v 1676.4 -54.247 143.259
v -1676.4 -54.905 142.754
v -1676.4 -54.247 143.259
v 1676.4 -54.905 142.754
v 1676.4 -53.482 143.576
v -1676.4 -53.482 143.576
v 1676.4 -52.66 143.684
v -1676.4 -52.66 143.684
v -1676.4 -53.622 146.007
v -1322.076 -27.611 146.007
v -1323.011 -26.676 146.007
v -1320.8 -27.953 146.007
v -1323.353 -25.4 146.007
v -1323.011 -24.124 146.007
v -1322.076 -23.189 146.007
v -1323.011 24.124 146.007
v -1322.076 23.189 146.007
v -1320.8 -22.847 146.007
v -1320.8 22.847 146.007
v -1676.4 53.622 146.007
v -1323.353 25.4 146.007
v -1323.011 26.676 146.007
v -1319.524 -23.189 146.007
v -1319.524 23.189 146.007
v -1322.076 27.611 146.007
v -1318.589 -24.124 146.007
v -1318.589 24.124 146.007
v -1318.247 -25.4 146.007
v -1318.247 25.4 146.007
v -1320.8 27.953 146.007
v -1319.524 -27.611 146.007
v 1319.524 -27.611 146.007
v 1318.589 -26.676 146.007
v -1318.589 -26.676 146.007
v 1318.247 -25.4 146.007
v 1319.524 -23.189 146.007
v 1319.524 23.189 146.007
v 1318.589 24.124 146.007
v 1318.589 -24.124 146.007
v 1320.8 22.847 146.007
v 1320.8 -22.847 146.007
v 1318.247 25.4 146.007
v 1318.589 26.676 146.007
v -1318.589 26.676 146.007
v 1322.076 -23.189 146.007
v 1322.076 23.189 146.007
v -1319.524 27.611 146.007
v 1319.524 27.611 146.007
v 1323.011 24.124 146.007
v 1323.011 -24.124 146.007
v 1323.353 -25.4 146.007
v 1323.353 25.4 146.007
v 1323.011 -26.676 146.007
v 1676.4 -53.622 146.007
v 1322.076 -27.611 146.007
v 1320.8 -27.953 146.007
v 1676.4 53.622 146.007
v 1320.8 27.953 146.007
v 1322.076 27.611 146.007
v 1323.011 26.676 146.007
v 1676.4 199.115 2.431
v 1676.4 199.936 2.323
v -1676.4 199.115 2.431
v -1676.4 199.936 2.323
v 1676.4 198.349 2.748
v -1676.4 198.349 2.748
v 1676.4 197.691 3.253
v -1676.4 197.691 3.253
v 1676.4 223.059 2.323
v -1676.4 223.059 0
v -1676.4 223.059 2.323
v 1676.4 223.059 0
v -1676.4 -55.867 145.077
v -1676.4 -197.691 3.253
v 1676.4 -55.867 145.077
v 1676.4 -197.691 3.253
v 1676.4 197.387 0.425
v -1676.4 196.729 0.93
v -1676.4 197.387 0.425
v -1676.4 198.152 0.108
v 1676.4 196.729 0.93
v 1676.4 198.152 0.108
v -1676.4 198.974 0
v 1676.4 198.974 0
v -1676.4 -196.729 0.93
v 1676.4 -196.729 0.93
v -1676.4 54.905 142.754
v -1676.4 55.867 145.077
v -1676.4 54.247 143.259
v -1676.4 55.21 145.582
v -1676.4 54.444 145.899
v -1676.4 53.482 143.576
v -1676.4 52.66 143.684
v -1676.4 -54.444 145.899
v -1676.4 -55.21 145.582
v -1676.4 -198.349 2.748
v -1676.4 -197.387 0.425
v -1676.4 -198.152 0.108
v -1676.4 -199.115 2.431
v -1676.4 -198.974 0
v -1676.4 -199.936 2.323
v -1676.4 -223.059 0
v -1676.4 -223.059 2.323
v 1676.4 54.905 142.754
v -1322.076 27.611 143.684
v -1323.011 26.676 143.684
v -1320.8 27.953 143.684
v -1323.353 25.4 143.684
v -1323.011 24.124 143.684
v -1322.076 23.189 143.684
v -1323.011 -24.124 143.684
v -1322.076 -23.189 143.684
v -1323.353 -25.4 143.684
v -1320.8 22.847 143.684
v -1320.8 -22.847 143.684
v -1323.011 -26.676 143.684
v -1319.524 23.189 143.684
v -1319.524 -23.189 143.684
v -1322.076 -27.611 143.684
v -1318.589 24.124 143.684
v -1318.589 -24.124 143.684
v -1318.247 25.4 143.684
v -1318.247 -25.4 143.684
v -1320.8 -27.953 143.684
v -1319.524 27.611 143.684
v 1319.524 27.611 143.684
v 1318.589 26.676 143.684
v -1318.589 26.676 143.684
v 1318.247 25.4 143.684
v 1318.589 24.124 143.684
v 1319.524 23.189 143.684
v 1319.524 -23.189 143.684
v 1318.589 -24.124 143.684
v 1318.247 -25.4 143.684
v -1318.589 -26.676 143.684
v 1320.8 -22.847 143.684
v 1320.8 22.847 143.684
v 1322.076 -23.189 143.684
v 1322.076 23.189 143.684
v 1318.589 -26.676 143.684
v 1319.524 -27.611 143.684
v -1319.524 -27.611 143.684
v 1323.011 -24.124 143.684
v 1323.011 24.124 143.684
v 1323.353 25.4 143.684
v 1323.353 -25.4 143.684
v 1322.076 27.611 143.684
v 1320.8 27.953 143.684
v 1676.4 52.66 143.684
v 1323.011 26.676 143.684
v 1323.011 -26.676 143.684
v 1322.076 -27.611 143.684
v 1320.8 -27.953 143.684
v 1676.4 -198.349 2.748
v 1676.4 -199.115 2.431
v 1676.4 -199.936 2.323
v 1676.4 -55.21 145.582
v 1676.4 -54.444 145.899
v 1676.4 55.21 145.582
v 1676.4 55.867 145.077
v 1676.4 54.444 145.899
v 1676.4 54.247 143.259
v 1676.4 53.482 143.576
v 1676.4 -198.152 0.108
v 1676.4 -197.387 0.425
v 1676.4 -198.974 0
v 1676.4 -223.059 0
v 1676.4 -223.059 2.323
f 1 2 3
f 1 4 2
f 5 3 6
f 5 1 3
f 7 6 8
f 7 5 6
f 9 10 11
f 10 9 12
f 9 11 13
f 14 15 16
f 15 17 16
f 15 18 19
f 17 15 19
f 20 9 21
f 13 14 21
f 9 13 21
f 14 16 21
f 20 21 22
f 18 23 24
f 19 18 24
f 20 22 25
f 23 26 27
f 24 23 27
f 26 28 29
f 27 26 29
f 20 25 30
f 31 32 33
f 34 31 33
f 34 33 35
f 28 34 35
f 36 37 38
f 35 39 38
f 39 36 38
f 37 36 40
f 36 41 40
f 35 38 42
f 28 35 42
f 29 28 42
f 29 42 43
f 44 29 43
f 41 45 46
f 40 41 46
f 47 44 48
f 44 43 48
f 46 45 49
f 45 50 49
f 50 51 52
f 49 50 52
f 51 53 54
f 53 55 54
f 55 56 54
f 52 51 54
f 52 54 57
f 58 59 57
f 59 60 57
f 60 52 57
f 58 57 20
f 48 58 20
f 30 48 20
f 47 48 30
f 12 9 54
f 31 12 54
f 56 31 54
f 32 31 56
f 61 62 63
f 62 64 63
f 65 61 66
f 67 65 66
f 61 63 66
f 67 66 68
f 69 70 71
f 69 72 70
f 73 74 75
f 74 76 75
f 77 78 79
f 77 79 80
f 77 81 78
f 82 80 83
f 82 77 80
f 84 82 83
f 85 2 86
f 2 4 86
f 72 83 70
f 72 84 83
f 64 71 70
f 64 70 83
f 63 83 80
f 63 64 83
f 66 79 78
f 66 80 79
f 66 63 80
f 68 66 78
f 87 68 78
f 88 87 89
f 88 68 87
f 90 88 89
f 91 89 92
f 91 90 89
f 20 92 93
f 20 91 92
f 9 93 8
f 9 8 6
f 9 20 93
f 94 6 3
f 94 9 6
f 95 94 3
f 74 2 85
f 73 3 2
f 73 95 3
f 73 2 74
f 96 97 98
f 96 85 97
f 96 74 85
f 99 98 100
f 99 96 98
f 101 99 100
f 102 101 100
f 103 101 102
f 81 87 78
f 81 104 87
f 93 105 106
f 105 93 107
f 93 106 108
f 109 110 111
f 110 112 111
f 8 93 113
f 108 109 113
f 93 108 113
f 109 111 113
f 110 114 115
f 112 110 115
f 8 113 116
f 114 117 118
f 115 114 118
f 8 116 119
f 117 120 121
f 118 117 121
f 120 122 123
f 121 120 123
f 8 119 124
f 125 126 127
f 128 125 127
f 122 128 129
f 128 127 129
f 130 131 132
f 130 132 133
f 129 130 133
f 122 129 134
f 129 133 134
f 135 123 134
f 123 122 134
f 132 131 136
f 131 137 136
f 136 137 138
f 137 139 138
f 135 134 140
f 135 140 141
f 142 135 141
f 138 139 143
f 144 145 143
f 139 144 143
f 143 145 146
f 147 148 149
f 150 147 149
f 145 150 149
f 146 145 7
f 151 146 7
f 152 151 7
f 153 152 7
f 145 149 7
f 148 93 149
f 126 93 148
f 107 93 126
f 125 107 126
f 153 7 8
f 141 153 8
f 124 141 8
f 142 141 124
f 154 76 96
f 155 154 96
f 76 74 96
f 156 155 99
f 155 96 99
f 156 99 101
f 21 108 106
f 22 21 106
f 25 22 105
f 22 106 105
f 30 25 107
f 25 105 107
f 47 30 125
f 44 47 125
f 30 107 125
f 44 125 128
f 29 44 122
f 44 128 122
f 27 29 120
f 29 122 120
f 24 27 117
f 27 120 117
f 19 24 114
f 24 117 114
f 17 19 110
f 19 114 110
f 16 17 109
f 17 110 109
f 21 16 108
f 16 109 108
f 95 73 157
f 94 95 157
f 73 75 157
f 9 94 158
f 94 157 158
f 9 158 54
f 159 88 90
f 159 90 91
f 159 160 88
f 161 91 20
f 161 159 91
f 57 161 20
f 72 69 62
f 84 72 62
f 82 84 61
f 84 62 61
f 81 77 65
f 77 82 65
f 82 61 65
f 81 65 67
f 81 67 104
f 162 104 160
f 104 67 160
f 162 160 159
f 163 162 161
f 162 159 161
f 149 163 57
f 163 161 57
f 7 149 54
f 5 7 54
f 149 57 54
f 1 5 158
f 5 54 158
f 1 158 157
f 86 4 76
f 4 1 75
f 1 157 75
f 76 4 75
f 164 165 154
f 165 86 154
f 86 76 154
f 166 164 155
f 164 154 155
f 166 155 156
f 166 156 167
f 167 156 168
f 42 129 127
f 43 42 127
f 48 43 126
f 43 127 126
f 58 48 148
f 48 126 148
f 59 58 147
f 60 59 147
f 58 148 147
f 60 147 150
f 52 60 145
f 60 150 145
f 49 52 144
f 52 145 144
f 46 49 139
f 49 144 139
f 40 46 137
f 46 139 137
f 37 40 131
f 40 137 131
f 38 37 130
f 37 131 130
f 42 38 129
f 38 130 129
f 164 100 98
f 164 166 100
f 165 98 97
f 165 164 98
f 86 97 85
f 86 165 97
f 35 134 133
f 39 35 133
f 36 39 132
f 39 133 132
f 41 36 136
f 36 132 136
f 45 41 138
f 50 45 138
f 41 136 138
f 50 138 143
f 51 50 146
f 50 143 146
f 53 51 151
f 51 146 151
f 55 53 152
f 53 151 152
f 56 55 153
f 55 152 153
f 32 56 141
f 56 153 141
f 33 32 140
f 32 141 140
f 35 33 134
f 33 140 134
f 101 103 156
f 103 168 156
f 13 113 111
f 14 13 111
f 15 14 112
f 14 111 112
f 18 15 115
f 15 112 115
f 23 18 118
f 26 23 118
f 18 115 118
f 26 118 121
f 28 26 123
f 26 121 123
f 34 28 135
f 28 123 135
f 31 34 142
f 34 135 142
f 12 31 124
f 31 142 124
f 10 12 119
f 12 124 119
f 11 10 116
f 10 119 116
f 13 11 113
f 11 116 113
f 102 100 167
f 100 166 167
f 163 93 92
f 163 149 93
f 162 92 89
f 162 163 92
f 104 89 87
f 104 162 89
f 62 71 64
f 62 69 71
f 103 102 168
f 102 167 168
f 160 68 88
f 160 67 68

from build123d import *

# Parameters (mm, degrees)
F1_DEPTH = 1676.4
F3_R     = 3.175
F4_R     = 3.175
F6_D     = 5.1054


with BuildPart() as f1:
    # F0 (on Right) → F1 (new body, symmetric)
    with BuildSketch(Plane.YZ):
        Polygon((198.6212466711, 2.3228325226), (64.5779461899, 136.3661330038), (62.9354555616, 134.7236423755), (197.6590979371, 0), (223.0590979371, 0), (223.0590979371, 2.3228325226), align=None)
        Polygon((54.937148734, 146.0069304597), (0, 146.0069304597), (0, 143.6840979371), (53.975, 143.6840979371), (62.9354555616, 134.7236423755), (64.5779461899, 136.3661330038), align=None)
    extrude(amount=F1_DEPTH, both=True)

    # F2: F1 across face


with BuildPart() as f1_1:
    add(f1.part)
    add(f1.part.mirror(Plane(origin=(0, 0, 144.8455141984), x_dir=(1, 0, 0), z_dir=(0, -1, 0))))

    # F3
    f3_edges = [f1_1.edges().sort_by_distance(p)[0] for p in [
        (0, -54.937149, 146.00693),
        (0, -198.621247, 2.322833),
        (0, 54.937149, 146.00693),
        (0, 198.621247, 2.322833),
        (0, -197.659098, 0),
        (0, 197.659098, 0),
    ]]
    fillet(f3_edges, radius=F3_R)

    # F4
    f4_edges = [f1_1.edges().sort_by_distance(p)[0] for p in [
        (0, -53.975, 143.684098),
        (0, 53.975, 143.684098),
    ]]
    fillet(f4_edges, radius=F4_R)

    # F6 (through all)
    with Locations(Plane.XY.offset(146.0069304597)):
        with Locations((-1320.8, 25.4), (-1320.8, -25.4), (1320.8, 25.4), (1320.8, -25.4)):
            Hole(F6_D / 2)


solid = f1_1.part
